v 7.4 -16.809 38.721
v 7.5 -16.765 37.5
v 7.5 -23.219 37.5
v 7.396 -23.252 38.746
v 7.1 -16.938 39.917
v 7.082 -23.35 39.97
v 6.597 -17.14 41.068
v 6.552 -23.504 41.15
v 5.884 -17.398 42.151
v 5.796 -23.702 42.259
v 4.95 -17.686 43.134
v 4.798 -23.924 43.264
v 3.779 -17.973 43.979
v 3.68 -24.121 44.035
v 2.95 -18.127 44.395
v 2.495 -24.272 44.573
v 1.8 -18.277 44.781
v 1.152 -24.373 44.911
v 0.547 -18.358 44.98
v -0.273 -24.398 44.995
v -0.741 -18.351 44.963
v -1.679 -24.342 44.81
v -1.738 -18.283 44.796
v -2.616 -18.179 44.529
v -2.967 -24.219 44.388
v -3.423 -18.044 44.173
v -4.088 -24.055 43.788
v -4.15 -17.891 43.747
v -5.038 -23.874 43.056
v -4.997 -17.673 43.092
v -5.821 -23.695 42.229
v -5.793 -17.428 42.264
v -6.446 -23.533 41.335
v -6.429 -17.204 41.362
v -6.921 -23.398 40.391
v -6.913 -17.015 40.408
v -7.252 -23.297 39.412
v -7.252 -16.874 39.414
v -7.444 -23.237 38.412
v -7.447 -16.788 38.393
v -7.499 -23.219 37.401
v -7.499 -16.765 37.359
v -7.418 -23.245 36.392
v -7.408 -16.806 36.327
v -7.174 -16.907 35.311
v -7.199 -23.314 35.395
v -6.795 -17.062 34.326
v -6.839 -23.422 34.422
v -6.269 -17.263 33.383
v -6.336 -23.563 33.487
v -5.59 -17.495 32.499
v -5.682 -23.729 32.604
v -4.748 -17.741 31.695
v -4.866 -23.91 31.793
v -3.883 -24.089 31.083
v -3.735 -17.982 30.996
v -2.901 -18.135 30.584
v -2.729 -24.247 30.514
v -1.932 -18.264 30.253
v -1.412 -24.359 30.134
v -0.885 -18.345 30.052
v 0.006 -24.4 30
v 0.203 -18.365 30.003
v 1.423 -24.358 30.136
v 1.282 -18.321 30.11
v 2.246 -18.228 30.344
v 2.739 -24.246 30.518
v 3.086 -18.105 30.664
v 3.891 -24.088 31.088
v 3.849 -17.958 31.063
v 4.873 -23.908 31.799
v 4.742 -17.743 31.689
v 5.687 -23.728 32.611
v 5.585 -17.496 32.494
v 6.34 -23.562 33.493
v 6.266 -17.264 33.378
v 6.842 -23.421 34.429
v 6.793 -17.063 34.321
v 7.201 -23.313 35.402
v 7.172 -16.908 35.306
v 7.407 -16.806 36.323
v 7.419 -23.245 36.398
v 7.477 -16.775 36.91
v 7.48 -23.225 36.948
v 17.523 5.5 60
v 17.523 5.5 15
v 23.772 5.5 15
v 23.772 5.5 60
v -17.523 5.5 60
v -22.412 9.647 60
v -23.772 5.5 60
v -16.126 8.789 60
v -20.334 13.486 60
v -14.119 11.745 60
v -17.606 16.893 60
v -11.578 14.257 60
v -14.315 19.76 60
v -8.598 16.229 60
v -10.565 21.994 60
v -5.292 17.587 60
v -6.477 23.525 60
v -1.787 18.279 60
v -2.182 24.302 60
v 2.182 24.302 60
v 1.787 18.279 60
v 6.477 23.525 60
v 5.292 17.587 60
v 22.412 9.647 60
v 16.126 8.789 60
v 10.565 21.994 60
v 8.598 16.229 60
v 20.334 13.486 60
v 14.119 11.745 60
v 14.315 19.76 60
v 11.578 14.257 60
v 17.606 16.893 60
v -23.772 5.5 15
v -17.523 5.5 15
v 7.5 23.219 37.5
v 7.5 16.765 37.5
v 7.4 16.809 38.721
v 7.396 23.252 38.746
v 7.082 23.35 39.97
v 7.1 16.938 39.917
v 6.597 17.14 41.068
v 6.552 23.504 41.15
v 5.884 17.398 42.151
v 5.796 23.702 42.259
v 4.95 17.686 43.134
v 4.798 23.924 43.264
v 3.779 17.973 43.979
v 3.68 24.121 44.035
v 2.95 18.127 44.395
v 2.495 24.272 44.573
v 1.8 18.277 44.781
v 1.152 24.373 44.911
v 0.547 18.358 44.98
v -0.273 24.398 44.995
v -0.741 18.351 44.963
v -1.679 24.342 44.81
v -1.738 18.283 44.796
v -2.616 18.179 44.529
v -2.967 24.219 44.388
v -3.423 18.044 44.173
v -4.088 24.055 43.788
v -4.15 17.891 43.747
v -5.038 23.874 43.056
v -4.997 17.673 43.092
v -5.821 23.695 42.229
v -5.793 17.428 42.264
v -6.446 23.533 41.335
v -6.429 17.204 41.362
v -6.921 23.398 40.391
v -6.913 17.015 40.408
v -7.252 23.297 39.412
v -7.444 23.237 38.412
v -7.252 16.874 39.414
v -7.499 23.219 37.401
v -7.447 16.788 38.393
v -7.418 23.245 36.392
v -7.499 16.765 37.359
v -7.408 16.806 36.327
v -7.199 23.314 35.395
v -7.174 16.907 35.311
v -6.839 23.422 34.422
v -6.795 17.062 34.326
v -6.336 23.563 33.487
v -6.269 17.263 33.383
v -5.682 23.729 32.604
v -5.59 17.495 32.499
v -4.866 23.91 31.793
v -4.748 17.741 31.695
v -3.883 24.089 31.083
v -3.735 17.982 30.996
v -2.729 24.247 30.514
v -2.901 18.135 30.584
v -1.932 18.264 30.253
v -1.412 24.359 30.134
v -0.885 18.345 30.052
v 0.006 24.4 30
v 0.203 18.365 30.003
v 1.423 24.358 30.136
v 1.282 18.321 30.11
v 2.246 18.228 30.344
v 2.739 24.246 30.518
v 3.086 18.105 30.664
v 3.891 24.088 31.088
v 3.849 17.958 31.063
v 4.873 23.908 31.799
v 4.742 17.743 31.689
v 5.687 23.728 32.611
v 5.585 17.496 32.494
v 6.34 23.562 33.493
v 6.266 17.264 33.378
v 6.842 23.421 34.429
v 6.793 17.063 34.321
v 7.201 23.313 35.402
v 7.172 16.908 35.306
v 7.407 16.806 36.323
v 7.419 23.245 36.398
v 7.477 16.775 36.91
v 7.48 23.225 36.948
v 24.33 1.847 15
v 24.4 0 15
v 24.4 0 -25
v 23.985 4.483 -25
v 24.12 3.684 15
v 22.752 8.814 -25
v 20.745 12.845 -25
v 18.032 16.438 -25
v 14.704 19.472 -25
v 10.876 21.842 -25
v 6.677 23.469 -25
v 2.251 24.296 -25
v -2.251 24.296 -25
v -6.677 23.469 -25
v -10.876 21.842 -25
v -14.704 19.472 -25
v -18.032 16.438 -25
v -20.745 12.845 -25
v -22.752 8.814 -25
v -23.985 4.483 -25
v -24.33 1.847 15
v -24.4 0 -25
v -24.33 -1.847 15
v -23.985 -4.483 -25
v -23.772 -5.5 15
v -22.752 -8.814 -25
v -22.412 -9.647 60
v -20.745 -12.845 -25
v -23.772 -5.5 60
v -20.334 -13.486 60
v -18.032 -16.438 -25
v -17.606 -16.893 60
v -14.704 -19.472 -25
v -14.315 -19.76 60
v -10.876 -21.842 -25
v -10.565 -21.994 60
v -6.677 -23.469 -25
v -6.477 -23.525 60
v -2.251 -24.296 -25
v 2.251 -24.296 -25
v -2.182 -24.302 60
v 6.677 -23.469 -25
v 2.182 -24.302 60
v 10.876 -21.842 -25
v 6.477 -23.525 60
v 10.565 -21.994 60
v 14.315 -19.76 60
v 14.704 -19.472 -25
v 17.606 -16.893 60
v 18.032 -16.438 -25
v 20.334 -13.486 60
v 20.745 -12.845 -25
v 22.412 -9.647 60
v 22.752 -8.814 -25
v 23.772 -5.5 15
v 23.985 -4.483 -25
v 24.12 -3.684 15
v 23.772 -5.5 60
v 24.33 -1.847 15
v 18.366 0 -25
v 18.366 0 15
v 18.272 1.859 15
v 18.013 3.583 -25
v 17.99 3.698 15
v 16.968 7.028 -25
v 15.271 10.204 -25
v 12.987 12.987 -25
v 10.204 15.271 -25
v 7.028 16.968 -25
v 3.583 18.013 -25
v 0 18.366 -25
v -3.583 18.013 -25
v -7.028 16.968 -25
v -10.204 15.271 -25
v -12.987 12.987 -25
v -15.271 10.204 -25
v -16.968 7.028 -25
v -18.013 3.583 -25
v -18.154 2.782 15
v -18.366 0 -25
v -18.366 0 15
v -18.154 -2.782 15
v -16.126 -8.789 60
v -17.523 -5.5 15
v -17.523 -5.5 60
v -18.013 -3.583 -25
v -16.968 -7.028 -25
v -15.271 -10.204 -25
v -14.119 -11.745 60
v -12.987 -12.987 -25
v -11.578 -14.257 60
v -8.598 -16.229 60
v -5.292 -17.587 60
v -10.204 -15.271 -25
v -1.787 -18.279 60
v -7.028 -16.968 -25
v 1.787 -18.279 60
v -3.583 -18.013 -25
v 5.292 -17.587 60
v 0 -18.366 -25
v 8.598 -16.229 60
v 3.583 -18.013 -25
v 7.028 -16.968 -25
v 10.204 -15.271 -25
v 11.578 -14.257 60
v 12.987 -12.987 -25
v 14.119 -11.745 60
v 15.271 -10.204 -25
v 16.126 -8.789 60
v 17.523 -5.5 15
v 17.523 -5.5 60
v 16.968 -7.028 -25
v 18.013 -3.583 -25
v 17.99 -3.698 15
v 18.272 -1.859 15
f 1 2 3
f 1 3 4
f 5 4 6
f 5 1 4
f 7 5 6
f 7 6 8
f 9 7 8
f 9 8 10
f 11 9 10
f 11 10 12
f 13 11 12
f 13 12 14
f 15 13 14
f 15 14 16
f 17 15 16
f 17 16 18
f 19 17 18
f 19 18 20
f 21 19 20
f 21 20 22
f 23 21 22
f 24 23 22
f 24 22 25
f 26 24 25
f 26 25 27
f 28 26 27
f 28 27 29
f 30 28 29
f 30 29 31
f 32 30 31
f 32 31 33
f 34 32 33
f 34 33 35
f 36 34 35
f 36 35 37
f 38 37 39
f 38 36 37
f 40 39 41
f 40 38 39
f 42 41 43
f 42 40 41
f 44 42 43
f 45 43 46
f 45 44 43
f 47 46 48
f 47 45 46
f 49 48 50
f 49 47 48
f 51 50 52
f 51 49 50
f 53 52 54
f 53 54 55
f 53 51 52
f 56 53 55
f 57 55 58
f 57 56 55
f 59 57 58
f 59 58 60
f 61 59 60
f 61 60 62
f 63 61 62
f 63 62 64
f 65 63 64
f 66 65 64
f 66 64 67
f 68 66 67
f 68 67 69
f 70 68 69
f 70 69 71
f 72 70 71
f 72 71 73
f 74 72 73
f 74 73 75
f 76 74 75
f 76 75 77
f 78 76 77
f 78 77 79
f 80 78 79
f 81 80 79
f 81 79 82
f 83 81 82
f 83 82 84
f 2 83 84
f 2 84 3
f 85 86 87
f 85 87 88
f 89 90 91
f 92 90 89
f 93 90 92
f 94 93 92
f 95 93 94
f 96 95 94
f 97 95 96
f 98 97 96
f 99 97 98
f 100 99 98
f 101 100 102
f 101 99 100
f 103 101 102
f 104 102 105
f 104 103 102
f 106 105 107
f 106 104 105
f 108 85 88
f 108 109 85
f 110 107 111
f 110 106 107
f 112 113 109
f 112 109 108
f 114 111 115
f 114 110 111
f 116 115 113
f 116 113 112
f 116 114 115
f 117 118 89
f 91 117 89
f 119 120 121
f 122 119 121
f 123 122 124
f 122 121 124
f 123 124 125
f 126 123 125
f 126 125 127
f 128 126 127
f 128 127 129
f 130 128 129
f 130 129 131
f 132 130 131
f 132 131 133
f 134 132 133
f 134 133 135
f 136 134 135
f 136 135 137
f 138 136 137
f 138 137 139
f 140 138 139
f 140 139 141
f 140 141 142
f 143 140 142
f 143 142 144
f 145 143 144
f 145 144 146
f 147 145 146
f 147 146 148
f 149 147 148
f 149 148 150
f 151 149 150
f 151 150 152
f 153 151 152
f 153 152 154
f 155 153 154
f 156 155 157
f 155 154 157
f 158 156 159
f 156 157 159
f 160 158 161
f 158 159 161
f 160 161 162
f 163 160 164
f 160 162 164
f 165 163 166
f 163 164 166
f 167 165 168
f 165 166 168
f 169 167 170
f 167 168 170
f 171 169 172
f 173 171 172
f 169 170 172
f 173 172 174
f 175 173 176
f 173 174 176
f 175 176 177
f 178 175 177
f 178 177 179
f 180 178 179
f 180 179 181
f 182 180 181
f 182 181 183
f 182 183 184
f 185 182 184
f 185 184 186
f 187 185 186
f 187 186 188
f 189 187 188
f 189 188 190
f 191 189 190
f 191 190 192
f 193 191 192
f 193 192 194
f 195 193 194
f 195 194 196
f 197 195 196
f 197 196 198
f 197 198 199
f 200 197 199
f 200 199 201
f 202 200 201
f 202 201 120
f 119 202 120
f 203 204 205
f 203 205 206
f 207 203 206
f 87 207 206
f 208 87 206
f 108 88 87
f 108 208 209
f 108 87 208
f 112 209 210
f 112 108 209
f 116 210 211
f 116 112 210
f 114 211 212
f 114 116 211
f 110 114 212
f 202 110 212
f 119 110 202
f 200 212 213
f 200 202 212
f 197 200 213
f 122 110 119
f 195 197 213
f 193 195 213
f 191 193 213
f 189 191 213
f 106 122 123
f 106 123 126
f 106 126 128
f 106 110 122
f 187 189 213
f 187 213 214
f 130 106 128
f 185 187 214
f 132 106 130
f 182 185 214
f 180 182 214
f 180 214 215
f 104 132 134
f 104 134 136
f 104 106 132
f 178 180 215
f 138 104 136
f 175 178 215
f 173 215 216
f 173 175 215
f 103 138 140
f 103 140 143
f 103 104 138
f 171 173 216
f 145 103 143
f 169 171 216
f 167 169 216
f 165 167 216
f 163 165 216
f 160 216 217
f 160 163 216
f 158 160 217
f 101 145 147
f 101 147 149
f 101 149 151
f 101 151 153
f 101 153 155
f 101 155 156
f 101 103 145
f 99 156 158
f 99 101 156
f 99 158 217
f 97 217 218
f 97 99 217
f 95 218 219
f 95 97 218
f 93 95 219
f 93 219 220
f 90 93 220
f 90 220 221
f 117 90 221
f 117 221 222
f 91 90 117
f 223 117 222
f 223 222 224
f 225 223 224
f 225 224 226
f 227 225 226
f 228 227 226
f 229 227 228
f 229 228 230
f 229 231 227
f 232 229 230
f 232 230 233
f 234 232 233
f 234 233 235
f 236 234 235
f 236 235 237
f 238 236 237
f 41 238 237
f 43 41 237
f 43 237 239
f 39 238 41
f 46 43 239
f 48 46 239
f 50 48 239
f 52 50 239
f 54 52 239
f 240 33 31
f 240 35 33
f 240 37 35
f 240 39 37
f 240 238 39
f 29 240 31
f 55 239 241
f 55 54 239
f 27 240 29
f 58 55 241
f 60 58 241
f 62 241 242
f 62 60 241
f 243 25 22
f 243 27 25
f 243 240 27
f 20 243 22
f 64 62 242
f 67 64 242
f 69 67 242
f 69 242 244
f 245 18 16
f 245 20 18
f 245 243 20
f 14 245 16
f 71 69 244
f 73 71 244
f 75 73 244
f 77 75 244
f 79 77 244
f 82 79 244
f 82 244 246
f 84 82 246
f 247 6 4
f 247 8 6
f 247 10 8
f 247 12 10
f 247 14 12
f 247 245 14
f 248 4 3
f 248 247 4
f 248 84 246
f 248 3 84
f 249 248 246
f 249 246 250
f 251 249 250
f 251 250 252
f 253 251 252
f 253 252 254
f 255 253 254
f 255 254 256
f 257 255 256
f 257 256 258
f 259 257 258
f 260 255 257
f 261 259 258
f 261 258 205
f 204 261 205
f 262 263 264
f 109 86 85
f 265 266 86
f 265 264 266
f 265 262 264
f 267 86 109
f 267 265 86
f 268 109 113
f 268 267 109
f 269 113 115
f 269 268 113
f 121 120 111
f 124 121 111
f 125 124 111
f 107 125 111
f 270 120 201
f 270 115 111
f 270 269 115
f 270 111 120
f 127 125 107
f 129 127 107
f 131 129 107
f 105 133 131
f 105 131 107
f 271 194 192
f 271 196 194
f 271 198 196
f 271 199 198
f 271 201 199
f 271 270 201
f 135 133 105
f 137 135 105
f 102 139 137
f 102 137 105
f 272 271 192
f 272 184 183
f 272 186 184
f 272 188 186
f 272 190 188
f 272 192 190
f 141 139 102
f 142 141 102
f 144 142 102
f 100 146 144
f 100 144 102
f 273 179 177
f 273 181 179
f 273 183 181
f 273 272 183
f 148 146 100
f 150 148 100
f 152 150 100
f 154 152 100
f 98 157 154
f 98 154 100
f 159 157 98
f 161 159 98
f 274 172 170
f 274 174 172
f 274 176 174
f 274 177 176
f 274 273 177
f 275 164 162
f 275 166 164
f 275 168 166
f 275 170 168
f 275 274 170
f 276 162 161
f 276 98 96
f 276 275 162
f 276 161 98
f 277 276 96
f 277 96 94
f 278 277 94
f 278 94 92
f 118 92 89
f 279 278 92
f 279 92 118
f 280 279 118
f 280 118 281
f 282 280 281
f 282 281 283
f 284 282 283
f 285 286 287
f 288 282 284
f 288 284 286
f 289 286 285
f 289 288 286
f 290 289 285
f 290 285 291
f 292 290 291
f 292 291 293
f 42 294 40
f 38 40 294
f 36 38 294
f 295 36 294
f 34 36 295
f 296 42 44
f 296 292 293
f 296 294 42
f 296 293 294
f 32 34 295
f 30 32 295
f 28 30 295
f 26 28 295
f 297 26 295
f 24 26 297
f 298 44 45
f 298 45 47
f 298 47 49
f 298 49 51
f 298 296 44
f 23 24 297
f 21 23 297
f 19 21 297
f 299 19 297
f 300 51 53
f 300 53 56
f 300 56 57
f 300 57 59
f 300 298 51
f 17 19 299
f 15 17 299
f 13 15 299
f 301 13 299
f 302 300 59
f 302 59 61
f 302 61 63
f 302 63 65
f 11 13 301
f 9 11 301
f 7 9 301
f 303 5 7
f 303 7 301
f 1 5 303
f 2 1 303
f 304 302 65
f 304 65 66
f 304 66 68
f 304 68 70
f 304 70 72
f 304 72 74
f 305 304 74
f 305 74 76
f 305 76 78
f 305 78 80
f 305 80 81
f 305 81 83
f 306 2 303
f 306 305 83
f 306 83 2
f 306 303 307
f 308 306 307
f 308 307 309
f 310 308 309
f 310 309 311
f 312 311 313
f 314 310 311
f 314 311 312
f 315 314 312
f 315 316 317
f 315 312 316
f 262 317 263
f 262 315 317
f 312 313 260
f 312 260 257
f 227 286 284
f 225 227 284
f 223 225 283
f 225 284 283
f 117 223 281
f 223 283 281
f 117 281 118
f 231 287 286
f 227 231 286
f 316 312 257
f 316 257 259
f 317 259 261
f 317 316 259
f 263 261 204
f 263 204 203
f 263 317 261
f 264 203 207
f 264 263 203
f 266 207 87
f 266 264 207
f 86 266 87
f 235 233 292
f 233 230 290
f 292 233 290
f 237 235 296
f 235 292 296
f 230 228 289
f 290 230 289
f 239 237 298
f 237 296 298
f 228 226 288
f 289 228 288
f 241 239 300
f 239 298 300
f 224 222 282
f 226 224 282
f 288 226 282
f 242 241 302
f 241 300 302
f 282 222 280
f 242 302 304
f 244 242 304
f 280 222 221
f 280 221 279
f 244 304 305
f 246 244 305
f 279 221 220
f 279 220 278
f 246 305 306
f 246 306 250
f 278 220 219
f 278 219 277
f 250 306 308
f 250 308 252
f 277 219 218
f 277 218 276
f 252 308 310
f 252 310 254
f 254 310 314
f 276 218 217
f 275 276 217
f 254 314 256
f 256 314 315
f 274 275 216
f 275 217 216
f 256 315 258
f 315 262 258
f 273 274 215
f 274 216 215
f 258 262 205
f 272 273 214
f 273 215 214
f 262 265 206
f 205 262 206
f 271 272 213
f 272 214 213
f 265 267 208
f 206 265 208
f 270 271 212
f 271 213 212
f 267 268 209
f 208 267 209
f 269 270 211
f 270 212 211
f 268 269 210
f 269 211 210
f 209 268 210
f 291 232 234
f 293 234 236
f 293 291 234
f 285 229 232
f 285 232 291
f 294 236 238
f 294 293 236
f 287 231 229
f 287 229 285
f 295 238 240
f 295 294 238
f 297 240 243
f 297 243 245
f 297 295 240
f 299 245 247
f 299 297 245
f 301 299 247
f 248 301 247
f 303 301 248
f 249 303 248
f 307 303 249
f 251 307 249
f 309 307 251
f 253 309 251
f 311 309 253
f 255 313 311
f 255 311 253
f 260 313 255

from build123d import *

# Parameters (mm, degrees)
F0_R          = 24.4
F0_R_2        = 18.36585117
F1_DEPTH      = 60
F2_R          = 24.4
F2_R_2        = 18.36585117
F3_DEPTH      = 25
F5_DEPTH      = 24.401
F5_DEPTH_BACK = 24.401
F6_R          = 7.5
F7_DEPTH      = 24.401
F7_DEPTH_BACK = 24.401


with BuildPart() as f1:
    # F0 (on Top) → F1 (new body)
    with BuildSketch(Plane.XY):
        Circle(F0_R)
        Circle(F0_R_2, mode=Mode.SUBTRACT)
    extrude(amount=F1_DEPTH)

    # F2 (on Top) → F3 (join)
    with BuildSketch(Plane.XY):
        Circle(F2_R)
        Circle(F2_R_2, mode=Mode.SUBTRACT)
    extrude(amount=-F3_DEPTH)

    # F4 (on Right) → F5 (cut, two sides)
    with BuildSketch(Plane.YZ) as f5_sk:
        Polygon((5.5, 60), (0, 60), (-5.5, 60), (-5.5, 15), (0, 15), (5.5, 15), align=None)
    extrude(amount=-F5_DEPTH, mode=Mode.SUBTRACT)
    extrude(f5_sk.sketch, amount=F5_DEPTH_BACK, mode=Mode.SUBTRACT)

    # F6 (on Front) → F7 (cut, two sides)
    with BuildSketch(Plane.XZ) as f7_sk:
        with Locations((0, 37.5)):
            Circle(F6_R)
    extrude(amount=-F7_DEPTH, mode=Mode.SUBTRACT)
    extrude(f7_sk.sketch, amount=F7_DEPTH_BACK, mode=Mode.SUBTRACT)


solid = f1.part
